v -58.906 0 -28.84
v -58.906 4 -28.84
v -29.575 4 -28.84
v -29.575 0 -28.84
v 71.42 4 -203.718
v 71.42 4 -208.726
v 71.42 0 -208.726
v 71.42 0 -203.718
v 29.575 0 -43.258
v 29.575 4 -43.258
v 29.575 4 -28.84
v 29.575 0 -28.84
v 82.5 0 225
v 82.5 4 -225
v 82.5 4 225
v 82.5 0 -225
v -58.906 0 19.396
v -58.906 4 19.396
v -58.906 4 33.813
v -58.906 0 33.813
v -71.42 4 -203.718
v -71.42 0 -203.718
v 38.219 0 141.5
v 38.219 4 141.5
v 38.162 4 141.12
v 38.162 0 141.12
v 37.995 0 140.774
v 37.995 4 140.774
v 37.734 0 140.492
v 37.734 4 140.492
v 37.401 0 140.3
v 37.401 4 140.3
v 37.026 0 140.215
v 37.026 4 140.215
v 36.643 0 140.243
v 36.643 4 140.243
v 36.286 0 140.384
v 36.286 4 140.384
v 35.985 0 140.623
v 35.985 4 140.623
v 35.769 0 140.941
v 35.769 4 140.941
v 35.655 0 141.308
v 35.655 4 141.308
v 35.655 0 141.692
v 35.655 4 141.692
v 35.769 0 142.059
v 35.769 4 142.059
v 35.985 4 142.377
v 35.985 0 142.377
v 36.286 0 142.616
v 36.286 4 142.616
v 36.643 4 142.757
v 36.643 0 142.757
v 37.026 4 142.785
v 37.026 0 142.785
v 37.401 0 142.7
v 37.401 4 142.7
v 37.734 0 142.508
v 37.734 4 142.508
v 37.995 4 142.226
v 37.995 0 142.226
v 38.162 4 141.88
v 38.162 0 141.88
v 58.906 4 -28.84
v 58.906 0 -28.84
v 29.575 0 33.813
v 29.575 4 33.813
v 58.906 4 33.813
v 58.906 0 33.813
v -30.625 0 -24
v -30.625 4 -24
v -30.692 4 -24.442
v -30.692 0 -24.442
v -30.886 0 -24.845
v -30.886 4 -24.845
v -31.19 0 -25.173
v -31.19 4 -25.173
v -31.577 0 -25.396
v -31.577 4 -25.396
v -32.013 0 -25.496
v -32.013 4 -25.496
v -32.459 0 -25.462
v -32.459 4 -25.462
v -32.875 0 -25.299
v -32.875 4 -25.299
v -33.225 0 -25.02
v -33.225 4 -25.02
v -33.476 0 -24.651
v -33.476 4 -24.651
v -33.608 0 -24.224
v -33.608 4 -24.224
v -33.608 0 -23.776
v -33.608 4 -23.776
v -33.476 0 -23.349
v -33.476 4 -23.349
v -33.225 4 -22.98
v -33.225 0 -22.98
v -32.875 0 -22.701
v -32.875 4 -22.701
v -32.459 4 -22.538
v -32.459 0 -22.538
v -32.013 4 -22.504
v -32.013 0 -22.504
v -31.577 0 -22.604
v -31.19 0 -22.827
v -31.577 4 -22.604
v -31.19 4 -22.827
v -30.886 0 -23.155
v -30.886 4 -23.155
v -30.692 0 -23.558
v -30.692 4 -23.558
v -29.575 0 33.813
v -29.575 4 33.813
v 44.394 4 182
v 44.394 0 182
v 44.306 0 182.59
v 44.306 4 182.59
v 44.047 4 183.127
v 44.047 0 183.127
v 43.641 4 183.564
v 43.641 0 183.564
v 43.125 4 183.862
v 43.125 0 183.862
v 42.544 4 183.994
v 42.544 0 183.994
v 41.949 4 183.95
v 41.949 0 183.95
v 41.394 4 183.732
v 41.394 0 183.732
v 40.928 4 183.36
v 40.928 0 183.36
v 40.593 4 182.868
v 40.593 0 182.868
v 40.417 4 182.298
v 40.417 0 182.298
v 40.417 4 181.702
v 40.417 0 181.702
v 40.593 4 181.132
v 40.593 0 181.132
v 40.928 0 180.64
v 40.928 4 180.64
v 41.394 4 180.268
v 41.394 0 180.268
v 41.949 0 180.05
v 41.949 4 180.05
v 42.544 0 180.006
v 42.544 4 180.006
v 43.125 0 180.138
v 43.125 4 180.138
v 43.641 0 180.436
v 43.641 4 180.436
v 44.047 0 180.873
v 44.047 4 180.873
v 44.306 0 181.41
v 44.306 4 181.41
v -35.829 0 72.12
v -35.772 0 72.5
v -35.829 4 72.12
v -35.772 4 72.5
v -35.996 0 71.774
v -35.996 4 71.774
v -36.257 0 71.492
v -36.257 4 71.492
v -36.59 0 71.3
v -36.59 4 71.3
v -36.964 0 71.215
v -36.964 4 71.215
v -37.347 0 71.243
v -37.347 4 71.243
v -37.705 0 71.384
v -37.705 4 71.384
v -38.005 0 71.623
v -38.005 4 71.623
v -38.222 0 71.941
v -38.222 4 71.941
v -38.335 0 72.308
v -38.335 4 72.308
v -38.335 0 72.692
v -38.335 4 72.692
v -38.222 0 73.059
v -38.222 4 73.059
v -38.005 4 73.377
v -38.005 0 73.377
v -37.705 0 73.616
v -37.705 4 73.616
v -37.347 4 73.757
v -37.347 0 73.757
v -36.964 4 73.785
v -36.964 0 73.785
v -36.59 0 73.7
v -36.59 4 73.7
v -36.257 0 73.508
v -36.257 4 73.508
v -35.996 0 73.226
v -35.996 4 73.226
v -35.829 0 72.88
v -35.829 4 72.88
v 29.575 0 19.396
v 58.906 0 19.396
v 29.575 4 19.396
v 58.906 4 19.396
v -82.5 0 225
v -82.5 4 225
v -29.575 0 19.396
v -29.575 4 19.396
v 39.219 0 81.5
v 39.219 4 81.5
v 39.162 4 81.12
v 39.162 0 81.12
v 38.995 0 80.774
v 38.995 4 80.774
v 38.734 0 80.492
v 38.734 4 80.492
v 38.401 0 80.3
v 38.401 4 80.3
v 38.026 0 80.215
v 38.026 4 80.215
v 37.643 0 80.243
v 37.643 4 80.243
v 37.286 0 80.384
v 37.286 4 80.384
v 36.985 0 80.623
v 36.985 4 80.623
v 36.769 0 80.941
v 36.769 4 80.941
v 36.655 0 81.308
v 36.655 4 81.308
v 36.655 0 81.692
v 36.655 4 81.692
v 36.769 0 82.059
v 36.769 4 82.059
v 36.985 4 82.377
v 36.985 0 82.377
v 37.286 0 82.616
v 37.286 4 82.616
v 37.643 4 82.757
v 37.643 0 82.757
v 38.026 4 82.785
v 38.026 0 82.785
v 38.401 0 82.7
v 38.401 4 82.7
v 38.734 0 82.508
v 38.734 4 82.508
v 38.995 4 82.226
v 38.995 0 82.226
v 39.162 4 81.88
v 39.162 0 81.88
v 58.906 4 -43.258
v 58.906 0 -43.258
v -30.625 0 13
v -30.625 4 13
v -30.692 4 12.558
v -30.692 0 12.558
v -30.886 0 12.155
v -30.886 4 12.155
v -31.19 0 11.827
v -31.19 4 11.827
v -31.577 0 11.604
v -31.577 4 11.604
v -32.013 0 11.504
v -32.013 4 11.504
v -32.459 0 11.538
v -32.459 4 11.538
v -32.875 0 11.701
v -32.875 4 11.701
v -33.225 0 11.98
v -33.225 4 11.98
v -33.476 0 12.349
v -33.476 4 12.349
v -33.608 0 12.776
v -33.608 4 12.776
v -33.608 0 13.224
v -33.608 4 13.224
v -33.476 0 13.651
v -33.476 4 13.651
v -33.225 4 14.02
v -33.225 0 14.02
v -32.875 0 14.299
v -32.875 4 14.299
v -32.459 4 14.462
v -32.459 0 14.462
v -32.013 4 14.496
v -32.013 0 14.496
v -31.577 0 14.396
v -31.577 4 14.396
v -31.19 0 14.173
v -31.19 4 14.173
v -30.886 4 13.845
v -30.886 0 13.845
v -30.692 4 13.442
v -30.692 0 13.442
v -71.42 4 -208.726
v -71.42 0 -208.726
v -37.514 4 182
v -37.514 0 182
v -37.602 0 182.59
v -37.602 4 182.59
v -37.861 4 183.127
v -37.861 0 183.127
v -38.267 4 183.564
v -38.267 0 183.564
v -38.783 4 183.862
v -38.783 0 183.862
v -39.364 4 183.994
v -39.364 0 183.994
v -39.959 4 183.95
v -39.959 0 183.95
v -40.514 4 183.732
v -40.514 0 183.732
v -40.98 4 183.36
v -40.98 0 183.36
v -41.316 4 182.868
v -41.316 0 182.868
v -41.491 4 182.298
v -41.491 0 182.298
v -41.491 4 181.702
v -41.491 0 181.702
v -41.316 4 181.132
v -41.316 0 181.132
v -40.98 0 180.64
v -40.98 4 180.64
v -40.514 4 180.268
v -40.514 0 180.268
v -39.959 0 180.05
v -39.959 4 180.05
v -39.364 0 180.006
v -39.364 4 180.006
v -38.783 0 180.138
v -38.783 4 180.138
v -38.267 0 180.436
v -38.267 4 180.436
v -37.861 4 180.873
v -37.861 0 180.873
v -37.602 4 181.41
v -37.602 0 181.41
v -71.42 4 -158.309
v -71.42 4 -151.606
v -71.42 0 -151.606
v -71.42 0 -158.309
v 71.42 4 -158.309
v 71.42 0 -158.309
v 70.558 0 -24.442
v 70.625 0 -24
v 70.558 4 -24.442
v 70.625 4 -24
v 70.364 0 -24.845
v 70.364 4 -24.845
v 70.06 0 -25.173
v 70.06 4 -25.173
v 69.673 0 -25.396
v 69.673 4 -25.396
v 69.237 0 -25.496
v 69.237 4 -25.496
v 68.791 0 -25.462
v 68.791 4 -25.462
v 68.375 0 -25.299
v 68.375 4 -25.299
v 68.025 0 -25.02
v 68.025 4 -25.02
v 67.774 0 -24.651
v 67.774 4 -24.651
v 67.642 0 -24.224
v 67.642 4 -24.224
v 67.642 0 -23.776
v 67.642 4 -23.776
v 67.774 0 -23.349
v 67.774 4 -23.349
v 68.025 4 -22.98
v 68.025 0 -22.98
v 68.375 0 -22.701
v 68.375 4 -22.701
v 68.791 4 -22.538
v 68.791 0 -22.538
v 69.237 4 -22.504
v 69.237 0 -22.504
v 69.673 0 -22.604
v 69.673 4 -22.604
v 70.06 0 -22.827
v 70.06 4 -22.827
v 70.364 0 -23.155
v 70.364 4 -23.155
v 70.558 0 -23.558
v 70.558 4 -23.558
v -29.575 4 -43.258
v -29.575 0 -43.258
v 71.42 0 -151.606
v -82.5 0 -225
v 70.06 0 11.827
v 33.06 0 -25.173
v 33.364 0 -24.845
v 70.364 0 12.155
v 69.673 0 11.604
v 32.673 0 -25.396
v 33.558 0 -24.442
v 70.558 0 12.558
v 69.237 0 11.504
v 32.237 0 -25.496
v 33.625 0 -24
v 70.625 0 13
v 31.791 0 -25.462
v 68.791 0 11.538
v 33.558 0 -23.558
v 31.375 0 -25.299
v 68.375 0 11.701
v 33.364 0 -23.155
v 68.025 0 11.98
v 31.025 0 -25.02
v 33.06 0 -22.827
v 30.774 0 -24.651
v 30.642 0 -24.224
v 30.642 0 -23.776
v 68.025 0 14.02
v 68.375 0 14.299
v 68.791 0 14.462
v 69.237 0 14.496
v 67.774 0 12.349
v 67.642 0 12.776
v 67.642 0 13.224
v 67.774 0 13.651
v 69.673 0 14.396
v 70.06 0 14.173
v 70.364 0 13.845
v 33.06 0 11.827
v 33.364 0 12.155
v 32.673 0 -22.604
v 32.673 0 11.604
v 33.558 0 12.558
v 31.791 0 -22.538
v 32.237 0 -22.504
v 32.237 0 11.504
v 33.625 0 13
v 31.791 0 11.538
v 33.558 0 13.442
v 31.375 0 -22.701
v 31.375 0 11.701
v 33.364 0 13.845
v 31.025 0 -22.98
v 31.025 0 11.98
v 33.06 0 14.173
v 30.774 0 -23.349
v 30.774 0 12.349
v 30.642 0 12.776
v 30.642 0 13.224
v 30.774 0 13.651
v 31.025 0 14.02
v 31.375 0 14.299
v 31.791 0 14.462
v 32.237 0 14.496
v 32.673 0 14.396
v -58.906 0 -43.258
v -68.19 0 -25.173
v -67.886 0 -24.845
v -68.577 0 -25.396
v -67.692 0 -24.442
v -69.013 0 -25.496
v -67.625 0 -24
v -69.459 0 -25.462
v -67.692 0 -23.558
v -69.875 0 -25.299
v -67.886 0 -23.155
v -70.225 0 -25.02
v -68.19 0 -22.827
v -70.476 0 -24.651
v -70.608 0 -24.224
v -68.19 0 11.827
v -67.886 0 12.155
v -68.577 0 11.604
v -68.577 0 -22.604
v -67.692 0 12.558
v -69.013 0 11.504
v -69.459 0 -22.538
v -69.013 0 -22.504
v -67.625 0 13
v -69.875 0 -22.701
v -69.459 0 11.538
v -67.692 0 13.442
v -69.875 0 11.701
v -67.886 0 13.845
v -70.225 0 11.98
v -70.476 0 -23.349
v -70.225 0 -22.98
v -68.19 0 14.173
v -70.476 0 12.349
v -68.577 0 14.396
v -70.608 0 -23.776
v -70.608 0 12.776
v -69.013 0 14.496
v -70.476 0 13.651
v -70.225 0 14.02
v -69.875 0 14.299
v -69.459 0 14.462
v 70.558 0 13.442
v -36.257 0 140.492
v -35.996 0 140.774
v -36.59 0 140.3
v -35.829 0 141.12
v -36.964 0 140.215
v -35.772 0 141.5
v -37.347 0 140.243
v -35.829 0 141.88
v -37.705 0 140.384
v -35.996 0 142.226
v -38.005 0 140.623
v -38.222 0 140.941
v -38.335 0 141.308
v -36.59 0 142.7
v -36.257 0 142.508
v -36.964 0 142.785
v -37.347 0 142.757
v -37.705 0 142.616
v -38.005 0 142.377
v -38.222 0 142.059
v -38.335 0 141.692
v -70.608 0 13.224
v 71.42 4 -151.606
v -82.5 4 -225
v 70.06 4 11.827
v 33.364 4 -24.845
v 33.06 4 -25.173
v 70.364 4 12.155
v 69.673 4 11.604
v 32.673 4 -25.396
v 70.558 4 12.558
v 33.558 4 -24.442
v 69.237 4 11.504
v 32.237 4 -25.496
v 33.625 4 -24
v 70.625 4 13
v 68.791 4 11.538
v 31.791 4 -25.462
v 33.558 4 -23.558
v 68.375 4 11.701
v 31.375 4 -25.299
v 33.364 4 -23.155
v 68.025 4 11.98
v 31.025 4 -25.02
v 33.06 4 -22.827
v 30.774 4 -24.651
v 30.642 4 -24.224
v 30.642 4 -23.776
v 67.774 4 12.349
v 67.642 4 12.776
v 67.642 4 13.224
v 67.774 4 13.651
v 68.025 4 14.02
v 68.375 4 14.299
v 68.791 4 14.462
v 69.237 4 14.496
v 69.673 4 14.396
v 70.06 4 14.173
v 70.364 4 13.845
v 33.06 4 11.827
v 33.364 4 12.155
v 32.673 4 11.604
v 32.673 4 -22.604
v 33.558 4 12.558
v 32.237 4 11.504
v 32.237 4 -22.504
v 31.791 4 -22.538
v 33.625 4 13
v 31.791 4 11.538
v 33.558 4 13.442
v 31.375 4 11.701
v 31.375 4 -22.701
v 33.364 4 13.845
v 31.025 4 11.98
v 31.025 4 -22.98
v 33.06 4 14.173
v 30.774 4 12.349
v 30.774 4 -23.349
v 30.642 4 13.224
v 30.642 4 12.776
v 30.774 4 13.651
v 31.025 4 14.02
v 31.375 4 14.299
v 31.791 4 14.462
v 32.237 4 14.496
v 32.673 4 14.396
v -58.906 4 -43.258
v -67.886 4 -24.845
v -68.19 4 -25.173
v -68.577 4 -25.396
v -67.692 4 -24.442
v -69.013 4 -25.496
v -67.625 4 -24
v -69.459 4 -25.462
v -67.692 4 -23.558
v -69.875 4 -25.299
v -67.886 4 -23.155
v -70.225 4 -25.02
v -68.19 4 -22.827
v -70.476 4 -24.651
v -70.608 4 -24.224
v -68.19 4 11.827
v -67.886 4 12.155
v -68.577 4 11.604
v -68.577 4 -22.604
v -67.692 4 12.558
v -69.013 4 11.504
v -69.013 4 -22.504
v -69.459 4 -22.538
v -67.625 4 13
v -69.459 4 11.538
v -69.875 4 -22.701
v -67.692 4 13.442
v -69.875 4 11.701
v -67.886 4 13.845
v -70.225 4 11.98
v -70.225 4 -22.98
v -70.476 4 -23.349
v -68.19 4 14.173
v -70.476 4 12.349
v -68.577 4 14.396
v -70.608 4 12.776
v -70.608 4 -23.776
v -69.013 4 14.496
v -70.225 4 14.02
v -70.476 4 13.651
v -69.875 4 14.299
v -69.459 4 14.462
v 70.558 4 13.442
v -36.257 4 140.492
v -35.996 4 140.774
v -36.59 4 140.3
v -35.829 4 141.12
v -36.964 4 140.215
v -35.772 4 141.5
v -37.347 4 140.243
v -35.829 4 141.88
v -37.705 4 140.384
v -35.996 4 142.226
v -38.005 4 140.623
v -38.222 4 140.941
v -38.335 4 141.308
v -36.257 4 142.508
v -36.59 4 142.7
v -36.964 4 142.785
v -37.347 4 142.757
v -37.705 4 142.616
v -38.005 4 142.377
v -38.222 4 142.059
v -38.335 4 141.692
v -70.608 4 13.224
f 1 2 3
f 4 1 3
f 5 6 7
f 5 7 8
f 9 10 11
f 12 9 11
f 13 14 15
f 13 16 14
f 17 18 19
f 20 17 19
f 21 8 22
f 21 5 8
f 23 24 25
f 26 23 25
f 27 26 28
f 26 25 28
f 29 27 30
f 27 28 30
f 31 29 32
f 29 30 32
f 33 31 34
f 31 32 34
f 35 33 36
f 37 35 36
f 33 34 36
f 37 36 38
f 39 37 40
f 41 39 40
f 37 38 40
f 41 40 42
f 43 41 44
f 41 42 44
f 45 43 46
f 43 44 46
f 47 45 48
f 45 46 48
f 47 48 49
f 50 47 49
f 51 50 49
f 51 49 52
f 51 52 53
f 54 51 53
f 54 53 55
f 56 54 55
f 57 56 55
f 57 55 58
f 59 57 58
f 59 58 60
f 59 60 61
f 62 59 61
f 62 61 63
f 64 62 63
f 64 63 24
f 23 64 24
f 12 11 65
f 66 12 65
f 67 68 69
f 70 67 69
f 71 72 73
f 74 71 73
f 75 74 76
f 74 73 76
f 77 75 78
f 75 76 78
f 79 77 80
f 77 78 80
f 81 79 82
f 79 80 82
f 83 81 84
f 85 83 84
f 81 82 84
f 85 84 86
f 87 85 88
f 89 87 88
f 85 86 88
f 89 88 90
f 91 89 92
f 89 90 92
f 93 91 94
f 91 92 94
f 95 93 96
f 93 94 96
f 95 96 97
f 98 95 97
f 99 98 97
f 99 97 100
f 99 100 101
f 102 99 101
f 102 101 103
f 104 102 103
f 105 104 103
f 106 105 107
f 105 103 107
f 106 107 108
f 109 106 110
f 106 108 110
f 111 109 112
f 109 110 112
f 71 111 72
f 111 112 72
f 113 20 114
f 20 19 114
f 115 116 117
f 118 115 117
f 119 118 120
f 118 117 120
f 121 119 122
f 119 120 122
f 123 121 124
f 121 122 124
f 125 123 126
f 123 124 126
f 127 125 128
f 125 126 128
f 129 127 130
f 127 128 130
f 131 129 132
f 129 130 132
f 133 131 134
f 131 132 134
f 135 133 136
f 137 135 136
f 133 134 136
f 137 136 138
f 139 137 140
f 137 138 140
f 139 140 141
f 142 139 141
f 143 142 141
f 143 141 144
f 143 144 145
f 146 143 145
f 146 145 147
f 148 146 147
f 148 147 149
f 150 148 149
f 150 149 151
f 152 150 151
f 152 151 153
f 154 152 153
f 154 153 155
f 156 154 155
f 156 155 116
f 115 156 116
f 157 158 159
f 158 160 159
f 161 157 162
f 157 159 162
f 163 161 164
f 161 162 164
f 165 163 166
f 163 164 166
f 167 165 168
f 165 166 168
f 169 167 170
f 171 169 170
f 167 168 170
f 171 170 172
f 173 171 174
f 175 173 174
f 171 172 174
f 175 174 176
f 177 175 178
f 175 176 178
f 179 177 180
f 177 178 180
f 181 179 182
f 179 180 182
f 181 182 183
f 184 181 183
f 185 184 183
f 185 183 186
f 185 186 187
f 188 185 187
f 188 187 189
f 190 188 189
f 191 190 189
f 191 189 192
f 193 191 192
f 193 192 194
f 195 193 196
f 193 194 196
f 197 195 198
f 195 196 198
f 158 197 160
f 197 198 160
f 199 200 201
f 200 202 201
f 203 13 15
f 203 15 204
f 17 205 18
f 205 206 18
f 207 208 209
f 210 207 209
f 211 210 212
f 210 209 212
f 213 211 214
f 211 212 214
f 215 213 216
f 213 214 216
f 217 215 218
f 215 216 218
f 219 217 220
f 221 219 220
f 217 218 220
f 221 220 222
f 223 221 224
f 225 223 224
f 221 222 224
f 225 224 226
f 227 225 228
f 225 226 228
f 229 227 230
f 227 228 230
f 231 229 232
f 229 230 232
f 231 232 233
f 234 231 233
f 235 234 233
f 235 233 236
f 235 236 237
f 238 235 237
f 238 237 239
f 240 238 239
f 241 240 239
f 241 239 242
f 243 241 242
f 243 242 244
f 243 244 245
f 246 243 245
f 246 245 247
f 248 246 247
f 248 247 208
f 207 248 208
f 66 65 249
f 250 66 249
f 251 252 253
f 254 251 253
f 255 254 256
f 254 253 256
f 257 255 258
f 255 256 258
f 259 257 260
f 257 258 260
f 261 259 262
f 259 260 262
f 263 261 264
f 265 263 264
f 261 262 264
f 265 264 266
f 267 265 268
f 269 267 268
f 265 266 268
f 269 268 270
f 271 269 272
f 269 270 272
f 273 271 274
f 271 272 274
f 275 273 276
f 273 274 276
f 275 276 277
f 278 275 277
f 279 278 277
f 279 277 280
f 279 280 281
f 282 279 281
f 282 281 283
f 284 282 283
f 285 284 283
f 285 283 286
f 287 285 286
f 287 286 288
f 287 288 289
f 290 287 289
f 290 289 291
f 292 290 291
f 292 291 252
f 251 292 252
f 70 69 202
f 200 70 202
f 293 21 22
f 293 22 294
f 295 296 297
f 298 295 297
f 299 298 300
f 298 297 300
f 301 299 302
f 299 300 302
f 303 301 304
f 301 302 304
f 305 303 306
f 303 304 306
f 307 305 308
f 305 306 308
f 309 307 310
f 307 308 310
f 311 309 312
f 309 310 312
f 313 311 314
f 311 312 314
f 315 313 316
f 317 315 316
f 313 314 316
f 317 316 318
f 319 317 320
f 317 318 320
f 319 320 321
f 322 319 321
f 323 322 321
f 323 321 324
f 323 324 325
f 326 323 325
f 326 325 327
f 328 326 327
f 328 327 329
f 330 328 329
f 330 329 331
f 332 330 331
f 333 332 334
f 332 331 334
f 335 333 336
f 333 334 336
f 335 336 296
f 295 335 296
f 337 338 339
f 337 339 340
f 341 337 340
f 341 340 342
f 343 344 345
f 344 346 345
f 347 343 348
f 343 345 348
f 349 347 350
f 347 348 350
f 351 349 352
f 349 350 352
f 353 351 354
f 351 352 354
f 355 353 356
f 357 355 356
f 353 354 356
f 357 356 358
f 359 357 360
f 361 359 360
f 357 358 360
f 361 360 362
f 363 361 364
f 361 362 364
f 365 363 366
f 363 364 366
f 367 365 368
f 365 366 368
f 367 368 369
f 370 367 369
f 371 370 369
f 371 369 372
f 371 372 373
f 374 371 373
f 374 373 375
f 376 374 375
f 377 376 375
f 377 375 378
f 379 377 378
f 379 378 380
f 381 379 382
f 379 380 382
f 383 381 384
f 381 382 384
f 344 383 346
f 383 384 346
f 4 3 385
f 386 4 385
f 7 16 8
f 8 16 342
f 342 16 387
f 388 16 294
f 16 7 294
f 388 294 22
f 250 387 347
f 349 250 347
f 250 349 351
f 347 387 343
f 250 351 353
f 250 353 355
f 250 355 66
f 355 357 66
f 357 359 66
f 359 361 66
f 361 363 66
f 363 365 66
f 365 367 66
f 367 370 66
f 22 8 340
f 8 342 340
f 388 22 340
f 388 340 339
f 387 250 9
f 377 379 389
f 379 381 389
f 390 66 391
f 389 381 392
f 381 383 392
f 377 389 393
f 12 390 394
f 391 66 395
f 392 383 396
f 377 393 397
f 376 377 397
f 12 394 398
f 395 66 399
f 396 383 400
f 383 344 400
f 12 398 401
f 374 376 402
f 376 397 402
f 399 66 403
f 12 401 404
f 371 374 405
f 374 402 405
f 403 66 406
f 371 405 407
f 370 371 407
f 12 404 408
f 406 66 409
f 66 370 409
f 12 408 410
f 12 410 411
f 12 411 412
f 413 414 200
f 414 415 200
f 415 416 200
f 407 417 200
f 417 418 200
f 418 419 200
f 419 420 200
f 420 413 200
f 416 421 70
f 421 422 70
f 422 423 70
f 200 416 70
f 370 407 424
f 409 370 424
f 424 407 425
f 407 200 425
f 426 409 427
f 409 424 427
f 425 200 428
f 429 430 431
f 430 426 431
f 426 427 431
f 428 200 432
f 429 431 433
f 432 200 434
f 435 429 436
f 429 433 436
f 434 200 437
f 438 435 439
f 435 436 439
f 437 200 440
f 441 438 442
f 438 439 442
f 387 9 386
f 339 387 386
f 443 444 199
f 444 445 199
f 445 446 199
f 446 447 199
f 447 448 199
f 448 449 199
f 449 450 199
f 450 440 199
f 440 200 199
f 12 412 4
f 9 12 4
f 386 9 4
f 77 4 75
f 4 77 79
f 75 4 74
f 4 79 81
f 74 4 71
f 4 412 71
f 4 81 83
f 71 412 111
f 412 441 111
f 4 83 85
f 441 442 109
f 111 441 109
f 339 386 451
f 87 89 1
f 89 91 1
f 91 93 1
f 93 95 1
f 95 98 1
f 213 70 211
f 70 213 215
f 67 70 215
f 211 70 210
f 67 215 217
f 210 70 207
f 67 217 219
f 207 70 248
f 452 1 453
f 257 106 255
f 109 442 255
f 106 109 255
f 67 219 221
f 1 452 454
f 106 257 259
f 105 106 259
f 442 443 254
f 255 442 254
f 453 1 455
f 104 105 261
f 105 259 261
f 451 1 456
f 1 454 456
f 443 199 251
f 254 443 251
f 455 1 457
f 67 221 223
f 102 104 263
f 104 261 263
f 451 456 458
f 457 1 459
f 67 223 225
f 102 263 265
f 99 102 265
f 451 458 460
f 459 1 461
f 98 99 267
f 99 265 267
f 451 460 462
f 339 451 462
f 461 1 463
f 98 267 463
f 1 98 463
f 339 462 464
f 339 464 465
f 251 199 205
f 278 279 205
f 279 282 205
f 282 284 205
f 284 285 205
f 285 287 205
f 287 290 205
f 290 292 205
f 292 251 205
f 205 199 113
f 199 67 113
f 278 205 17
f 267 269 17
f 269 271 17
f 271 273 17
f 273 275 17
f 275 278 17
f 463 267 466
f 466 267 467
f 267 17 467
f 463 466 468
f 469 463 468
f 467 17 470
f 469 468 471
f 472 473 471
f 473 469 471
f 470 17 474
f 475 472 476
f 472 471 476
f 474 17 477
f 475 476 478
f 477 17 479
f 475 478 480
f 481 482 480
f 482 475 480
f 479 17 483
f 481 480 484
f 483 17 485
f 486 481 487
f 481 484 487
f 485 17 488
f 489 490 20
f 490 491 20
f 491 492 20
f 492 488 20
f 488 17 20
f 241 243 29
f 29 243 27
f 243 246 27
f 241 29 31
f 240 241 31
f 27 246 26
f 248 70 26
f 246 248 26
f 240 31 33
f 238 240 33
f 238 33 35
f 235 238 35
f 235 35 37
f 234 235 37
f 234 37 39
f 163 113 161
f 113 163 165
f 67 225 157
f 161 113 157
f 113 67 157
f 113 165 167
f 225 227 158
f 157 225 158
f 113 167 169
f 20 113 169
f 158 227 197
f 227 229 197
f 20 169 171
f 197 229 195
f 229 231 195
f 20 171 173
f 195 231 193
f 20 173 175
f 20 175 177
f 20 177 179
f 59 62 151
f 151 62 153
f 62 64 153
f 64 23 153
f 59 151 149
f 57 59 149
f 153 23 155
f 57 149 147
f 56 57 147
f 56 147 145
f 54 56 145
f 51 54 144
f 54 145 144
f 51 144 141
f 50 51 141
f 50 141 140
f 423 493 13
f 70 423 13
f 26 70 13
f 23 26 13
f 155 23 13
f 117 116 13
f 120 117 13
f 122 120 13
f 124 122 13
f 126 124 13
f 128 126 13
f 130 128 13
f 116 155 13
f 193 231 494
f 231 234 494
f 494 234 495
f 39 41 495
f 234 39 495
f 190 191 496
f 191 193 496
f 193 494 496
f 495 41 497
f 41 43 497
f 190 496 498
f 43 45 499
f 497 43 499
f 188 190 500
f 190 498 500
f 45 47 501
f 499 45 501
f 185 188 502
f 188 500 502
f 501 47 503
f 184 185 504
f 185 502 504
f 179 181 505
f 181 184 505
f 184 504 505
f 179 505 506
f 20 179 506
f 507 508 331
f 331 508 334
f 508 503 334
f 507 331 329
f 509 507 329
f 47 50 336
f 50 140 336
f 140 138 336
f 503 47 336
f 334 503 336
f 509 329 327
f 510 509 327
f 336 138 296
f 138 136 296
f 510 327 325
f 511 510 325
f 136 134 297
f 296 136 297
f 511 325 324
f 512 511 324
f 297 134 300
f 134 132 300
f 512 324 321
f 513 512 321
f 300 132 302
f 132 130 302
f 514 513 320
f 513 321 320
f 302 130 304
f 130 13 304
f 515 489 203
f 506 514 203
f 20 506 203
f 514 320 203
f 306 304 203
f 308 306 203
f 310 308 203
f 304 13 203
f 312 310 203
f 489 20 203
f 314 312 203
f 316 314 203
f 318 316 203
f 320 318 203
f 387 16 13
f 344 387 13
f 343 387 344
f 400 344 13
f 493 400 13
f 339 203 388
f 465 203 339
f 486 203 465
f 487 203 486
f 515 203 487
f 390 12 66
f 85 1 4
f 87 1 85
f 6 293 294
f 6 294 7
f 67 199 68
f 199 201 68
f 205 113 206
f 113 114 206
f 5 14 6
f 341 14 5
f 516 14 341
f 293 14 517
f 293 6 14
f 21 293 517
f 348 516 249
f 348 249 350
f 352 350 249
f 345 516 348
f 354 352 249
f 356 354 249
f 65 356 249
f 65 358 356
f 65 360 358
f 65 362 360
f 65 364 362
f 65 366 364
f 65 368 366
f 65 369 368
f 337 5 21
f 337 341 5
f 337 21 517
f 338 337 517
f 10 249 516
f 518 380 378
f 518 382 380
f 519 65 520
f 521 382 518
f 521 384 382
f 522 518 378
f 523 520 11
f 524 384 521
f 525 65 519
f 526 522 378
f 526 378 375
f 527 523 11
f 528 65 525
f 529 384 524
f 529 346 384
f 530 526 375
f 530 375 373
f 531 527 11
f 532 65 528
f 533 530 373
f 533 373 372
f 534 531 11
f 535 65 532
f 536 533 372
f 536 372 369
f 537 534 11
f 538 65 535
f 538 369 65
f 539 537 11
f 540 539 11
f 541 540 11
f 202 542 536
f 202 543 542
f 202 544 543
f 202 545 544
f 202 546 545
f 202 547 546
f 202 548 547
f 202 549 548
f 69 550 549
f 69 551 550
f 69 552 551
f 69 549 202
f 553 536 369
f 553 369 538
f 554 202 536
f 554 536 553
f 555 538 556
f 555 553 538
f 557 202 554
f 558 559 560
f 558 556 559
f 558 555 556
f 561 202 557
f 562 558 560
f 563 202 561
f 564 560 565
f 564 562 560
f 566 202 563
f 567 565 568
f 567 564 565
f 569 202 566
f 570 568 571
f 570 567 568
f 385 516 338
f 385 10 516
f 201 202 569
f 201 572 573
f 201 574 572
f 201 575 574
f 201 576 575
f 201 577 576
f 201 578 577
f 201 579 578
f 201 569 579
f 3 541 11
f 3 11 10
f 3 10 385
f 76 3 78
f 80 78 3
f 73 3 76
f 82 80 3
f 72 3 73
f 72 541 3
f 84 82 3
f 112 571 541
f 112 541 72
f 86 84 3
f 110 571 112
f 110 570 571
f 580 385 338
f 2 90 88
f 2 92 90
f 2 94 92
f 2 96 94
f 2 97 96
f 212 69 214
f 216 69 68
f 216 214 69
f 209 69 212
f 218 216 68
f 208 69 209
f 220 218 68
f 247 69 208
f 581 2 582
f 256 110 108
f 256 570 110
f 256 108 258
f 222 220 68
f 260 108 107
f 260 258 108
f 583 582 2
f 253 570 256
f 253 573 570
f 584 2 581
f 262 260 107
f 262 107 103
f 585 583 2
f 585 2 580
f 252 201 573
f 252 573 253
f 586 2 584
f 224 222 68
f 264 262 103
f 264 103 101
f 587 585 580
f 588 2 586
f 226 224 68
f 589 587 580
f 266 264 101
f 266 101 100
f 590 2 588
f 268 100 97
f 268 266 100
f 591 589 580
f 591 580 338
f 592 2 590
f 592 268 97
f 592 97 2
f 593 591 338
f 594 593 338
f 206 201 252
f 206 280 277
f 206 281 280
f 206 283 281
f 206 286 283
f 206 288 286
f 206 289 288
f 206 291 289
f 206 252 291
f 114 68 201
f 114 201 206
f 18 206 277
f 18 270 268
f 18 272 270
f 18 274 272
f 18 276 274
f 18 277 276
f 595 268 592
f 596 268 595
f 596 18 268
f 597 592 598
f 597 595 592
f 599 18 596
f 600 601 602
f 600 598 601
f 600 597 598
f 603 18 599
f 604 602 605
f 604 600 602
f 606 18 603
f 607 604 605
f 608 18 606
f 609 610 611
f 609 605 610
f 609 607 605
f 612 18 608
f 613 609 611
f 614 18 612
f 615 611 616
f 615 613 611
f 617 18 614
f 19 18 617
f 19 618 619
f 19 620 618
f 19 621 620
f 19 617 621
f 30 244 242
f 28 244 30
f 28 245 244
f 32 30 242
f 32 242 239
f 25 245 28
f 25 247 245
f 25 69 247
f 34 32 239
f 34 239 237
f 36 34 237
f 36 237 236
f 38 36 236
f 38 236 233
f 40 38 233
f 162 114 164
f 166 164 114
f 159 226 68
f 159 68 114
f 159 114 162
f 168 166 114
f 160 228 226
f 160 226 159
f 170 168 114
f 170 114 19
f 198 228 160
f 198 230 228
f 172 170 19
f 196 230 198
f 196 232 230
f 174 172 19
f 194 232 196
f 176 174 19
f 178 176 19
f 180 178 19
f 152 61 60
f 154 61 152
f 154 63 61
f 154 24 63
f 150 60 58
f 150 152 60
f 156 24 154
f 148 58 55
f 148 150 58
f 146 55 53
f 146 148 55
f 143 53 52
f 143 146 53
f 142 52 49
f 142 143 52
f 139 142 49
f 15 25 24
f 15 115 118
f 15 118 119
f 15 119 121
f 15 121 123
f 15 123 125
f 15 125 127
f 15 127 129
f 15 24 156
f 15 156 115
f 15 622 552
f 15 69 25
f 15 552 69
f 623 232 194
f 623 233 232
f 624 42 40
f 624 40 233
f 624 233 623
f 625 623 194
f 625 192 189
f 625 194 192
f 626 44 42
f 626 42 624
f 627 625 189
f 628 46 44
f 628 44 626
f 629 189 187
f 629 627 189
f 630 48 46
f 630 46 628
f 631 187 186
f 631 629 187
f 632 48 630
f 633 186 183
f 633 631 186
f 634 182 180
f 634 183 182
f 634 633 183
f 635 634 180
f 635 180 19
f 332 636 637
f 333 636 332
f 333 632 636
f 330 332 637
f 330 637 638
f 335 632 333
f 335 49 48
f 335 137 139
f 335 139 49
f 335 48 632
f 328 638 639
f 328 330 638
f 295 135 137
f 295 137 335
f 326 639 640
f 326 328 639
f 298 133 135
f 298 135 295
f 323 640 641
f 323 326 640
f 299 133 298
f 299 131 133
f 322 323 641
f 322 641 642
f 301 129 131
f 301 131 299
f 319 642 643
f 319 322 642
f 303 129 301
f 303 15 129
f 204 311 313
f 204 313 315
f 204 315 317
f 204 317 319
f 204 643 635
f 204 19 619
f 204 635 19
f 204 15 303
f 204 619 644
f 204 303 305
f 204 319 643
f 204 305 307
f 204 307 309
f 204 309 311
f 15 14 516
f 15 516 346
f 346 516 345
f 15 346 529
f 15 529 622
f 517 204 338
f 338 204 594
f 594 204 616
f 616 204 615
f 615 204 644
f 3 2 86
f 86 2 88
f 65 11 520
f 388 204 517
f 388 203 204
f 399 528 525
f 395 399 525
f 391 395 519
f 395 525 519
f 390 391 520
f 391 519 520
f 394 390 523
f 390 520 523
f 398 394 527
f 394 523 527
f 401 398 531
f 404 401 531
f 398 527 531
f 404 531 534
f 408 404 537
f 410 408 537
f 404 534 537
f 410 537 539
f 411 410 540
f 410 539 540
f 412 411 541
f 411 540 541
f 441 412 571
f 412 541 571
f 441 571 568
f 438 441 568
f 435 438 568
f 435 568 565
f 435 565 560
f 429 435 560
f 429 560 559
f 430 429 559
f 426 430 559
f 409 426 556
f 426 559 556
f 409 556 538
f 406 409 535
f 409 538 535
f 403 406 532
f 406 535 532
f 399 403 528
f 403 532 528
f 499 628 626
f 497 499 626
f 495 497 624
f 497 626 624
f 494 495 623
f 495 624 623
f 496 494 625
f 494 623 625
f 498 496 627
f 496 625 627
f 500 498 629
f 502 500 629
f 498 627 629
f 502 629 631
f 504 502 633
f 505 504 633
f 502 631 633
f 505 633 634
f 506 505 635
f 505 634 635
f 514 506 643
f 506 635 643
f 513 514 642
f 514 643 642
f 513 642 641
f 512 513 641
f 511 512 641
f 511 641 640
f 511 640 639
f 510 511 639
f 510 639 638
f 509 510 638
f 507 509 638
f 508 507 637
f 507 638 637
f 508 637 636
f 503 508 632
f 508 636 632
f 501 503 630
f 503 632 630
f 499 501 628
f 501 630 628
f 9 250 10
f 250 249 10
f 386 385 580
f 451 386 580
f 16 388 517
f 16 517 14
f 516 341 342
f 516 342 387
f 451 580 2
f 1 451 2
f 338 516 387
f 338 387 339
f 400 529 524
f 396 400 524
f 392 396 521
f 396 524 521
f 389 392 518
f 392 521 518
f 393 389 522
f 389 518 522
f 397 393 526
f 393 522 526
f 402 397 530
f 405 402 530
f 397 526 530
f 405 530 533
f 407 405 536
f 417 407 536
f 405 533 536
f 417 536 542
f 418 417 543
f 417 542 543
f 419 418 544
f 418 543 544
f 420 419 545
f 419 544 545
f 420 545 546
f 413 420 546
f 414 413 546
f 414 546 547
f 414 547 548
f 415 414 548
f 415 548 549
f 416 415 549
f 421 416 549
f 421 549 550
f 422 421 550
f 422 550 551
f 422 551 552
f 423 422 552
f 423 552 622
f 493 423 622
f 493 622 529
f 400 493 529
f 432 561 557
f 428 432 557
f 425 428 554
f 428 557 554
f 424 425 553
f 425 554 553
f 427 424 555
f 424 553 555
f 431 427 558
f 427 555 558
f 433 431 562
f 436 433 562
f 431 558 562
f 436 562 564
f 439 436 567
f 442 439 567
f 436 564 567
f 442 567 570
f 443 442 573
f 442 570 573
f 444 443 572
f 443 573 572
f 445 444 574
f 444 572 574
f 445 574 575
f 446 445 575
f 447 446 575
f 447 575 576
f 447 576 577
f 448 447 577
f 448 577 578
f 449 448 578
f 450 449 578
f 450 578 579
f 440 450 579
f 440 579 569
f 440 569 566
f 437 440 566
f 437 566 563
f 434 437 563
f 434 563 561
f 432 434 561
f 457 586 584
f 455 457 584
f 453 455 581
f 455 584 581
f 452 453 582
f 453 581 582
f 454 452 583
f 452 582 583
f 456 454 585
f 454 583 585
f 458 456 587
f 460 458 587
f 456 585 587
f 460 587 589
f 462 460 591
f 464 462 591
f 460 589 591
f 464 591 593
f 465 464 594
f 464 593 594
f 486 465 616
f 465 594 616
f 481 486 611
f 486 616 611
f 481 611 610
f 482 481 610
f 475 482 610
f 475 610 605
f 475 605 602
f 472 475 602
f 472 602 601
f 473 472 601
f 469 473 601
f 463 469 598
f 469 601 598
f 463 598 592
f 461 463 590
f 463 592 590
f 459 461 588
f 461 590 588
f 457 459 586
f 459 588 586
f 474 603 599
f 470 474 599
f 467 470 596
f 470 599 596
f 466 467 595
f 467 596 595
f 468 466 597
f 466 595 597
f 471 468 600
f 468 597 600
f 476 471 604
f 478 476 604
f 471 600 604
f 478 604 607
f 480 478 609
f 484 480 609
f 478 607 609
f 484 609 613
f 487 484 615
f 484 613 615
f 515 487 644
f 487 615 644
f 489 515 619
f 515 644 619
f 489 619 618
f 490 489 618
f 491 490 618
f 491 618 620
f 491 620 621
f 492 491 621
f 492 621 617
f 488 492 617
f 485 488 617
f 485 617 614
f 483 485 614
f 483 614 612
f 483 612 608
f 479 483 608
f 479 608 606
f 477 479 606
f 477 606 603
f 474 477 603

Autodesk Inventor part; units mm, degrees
ref_plane "YZ Plane" through (0, 0, 0) normal (1, 0, 0) x (0, 1, 0)
ref_plane "XZ Plane" through (0, 0, 0) normal (0, 1, 0) x (-1, 0, 0)
ref_plane "XY Plane" through (0, 0, 0) normal (0, 0, 1) x (1, 0, 0)
sketch "Эскиз1" plane through (0, 0, 0) normal (0, 1, 0) x (-1, 0, 0)
  line L0 (-82.5, 225) -> (82.5, 225)
  line L1 (82.5, 225) -> (82.5, -225)
  line L2 (82.5, -225) -> (-82.5, -225)
  line L3 (-82.5, -225) -> (-82.5, 225)
  line L4 (-82.5, 225) -> (82.5, -225) construction
  line L5 (82.5, 225) -> (-82.5, -225) construction
  point P0 (0, 0)
  dimension "d0" = 165
  dimension "d1" = 450
extrude "Выдавливание1" add sketch "Эскиз1" along normal blind 4
sketch "Эскиз3" plane through (0, 0, 0) normal (0, -1, 0) x (1, 0, 0)
  circle A0 centre (42.3945, 182) radius 2 projected
  circle A1 centre (-39.5136, 182) radius 2 projected
  point P0 (0, 0)
extrude "Выдавливание3" cut sketch "Эскиз3" against normal blind 4
sketch "Эскиз4" plane through (0, 4, 0) normal (0, 1, 0) x (1, 0, 0)
  circle A0 centre (37.93, -81.5) radius 1.2889 projected
  circle A1 centre (-37.0605, -72.5) radius 1.2889 projected
  circle A2 centre (-37.0605, -141.5) radius 1.2889 projected
  circle A3 centre (36.93, -141.5) radius 1.2889 projected
  circle A4 centre (32.125, -13) radius 1.5 projected
  circle A5 centre (69.125, -13) radius 1.5 projected
  circle A6 centre (69.125, 24) radius 1.5 projected
  circle A7 centre (32.125, 24) radius 1.5 projected
  circle A8 centre (-32.125, 24) radius 1.5 projected
  circle A9 centre (-69.125, 24) radius 1.5 projected
  circle A10 centre (-69.125, -13) radius 1.5 projected
  circle A11 centre (-32.125, -13) radius 1.5 projected
  point P0 (0, 0)
extrude "Выдавливание4" cut sketch "Эскиз4" against normal blind 4
sketch "Эскиз5" plane through (0, 4, 0) normal (0, 1, 0) x (1, 0, 0)
  line L0 (-58.9065, 28.8404) -> (-29.5747, 28.8404)
  line L1 (-29.5747, 28.8404) -> (-29.5747, 43.2578)
  line L2 (-29.5747, 43.2578) -> (-58.9065, 43.2578)
  line L3 (-58.9065, 43.2578) -> (-58.9065, 28.8404)
  line L4 (-58.9065, 28.8404) -> (-29.5747, 43.2578) construction
  line L5 (-29.5747, 28.8404) -> (-58.9065, 43.2578) construction
  line L6 (-58.9065, -33.8129) -> (-29.5747, -33.8129)
  line L7 (-29.5747, -33.8129) -> (-29.5747, -19.3955)
  line L8 (-29.5747, -19.3955) -> (-58.9065, -19.3955)
  line L9 (-58.9065, -19.3955) -> (-58.9065, -33.8129)
  line L10 (-58.9065, -33.8129) -> (-29.5747, -19.3955) construction
  line L11 (-29.5747, -33.8129) -> (-58.9065, -19.3955) construction
  point P0 (0, 0)
  point P1 (-44.2406, 36.0491)
  point P2 (-44.2406, -26.6042)
extrude "Выдавливание5" cut sketch "Эскиз5" against normal blind 4
mirror "Зеркальное отражение1" about plane through (0, 0, 0) normal (1, 0, 0) of "Выдавливание5"
sketch "Эскиз6" plane through (0, 4, 0) normal (0, 1, 0) x (1, 0, 0)
  line L0 (71.4196, 151.6055) -> (-71.4196, 151.6055)
  line L1 (-71.4196, 151.6055) -> (-71.4196, 158.3091)
  line L2 (-71.4196, 158.3091) -> (71.4196, 158.3091)
  line L3 (71.4196, 158.3091) -> (71.4196, 151.6055)
  line L4 (71.4196, 151.6055) -> (-71.4196, 158.3091) construction
  line L5 (-71.4196, 151.6055) -> (71.4196, 158.3091) construction
  line L6 (71.4196, 203.7182) -> (-71.4196, 203.7182)
  line L7 (-71.4196, 203.7182) -> (-71.4196, 208.7265)
  line L8 (-71.4196, 208.7265) -> (71.4196, 208.7265)
  line L9 (71.4196, 208.7265) -> (71.4196, 203.7182)
  line L10 (71.4196, 203.7182) -> (-71.4196, 208.7265) construction
  line L11 (-71.4196, 203.7182) -> (71.4196, 208.7265) construction
  point P0 (0, 0)
  point P1 (0, 154.9573)
  point P2 (0, 206.2223)
extrude "Выдавливание6" cut sketch "Эскиз6" against normal blind 4
properties part number "bottom"
